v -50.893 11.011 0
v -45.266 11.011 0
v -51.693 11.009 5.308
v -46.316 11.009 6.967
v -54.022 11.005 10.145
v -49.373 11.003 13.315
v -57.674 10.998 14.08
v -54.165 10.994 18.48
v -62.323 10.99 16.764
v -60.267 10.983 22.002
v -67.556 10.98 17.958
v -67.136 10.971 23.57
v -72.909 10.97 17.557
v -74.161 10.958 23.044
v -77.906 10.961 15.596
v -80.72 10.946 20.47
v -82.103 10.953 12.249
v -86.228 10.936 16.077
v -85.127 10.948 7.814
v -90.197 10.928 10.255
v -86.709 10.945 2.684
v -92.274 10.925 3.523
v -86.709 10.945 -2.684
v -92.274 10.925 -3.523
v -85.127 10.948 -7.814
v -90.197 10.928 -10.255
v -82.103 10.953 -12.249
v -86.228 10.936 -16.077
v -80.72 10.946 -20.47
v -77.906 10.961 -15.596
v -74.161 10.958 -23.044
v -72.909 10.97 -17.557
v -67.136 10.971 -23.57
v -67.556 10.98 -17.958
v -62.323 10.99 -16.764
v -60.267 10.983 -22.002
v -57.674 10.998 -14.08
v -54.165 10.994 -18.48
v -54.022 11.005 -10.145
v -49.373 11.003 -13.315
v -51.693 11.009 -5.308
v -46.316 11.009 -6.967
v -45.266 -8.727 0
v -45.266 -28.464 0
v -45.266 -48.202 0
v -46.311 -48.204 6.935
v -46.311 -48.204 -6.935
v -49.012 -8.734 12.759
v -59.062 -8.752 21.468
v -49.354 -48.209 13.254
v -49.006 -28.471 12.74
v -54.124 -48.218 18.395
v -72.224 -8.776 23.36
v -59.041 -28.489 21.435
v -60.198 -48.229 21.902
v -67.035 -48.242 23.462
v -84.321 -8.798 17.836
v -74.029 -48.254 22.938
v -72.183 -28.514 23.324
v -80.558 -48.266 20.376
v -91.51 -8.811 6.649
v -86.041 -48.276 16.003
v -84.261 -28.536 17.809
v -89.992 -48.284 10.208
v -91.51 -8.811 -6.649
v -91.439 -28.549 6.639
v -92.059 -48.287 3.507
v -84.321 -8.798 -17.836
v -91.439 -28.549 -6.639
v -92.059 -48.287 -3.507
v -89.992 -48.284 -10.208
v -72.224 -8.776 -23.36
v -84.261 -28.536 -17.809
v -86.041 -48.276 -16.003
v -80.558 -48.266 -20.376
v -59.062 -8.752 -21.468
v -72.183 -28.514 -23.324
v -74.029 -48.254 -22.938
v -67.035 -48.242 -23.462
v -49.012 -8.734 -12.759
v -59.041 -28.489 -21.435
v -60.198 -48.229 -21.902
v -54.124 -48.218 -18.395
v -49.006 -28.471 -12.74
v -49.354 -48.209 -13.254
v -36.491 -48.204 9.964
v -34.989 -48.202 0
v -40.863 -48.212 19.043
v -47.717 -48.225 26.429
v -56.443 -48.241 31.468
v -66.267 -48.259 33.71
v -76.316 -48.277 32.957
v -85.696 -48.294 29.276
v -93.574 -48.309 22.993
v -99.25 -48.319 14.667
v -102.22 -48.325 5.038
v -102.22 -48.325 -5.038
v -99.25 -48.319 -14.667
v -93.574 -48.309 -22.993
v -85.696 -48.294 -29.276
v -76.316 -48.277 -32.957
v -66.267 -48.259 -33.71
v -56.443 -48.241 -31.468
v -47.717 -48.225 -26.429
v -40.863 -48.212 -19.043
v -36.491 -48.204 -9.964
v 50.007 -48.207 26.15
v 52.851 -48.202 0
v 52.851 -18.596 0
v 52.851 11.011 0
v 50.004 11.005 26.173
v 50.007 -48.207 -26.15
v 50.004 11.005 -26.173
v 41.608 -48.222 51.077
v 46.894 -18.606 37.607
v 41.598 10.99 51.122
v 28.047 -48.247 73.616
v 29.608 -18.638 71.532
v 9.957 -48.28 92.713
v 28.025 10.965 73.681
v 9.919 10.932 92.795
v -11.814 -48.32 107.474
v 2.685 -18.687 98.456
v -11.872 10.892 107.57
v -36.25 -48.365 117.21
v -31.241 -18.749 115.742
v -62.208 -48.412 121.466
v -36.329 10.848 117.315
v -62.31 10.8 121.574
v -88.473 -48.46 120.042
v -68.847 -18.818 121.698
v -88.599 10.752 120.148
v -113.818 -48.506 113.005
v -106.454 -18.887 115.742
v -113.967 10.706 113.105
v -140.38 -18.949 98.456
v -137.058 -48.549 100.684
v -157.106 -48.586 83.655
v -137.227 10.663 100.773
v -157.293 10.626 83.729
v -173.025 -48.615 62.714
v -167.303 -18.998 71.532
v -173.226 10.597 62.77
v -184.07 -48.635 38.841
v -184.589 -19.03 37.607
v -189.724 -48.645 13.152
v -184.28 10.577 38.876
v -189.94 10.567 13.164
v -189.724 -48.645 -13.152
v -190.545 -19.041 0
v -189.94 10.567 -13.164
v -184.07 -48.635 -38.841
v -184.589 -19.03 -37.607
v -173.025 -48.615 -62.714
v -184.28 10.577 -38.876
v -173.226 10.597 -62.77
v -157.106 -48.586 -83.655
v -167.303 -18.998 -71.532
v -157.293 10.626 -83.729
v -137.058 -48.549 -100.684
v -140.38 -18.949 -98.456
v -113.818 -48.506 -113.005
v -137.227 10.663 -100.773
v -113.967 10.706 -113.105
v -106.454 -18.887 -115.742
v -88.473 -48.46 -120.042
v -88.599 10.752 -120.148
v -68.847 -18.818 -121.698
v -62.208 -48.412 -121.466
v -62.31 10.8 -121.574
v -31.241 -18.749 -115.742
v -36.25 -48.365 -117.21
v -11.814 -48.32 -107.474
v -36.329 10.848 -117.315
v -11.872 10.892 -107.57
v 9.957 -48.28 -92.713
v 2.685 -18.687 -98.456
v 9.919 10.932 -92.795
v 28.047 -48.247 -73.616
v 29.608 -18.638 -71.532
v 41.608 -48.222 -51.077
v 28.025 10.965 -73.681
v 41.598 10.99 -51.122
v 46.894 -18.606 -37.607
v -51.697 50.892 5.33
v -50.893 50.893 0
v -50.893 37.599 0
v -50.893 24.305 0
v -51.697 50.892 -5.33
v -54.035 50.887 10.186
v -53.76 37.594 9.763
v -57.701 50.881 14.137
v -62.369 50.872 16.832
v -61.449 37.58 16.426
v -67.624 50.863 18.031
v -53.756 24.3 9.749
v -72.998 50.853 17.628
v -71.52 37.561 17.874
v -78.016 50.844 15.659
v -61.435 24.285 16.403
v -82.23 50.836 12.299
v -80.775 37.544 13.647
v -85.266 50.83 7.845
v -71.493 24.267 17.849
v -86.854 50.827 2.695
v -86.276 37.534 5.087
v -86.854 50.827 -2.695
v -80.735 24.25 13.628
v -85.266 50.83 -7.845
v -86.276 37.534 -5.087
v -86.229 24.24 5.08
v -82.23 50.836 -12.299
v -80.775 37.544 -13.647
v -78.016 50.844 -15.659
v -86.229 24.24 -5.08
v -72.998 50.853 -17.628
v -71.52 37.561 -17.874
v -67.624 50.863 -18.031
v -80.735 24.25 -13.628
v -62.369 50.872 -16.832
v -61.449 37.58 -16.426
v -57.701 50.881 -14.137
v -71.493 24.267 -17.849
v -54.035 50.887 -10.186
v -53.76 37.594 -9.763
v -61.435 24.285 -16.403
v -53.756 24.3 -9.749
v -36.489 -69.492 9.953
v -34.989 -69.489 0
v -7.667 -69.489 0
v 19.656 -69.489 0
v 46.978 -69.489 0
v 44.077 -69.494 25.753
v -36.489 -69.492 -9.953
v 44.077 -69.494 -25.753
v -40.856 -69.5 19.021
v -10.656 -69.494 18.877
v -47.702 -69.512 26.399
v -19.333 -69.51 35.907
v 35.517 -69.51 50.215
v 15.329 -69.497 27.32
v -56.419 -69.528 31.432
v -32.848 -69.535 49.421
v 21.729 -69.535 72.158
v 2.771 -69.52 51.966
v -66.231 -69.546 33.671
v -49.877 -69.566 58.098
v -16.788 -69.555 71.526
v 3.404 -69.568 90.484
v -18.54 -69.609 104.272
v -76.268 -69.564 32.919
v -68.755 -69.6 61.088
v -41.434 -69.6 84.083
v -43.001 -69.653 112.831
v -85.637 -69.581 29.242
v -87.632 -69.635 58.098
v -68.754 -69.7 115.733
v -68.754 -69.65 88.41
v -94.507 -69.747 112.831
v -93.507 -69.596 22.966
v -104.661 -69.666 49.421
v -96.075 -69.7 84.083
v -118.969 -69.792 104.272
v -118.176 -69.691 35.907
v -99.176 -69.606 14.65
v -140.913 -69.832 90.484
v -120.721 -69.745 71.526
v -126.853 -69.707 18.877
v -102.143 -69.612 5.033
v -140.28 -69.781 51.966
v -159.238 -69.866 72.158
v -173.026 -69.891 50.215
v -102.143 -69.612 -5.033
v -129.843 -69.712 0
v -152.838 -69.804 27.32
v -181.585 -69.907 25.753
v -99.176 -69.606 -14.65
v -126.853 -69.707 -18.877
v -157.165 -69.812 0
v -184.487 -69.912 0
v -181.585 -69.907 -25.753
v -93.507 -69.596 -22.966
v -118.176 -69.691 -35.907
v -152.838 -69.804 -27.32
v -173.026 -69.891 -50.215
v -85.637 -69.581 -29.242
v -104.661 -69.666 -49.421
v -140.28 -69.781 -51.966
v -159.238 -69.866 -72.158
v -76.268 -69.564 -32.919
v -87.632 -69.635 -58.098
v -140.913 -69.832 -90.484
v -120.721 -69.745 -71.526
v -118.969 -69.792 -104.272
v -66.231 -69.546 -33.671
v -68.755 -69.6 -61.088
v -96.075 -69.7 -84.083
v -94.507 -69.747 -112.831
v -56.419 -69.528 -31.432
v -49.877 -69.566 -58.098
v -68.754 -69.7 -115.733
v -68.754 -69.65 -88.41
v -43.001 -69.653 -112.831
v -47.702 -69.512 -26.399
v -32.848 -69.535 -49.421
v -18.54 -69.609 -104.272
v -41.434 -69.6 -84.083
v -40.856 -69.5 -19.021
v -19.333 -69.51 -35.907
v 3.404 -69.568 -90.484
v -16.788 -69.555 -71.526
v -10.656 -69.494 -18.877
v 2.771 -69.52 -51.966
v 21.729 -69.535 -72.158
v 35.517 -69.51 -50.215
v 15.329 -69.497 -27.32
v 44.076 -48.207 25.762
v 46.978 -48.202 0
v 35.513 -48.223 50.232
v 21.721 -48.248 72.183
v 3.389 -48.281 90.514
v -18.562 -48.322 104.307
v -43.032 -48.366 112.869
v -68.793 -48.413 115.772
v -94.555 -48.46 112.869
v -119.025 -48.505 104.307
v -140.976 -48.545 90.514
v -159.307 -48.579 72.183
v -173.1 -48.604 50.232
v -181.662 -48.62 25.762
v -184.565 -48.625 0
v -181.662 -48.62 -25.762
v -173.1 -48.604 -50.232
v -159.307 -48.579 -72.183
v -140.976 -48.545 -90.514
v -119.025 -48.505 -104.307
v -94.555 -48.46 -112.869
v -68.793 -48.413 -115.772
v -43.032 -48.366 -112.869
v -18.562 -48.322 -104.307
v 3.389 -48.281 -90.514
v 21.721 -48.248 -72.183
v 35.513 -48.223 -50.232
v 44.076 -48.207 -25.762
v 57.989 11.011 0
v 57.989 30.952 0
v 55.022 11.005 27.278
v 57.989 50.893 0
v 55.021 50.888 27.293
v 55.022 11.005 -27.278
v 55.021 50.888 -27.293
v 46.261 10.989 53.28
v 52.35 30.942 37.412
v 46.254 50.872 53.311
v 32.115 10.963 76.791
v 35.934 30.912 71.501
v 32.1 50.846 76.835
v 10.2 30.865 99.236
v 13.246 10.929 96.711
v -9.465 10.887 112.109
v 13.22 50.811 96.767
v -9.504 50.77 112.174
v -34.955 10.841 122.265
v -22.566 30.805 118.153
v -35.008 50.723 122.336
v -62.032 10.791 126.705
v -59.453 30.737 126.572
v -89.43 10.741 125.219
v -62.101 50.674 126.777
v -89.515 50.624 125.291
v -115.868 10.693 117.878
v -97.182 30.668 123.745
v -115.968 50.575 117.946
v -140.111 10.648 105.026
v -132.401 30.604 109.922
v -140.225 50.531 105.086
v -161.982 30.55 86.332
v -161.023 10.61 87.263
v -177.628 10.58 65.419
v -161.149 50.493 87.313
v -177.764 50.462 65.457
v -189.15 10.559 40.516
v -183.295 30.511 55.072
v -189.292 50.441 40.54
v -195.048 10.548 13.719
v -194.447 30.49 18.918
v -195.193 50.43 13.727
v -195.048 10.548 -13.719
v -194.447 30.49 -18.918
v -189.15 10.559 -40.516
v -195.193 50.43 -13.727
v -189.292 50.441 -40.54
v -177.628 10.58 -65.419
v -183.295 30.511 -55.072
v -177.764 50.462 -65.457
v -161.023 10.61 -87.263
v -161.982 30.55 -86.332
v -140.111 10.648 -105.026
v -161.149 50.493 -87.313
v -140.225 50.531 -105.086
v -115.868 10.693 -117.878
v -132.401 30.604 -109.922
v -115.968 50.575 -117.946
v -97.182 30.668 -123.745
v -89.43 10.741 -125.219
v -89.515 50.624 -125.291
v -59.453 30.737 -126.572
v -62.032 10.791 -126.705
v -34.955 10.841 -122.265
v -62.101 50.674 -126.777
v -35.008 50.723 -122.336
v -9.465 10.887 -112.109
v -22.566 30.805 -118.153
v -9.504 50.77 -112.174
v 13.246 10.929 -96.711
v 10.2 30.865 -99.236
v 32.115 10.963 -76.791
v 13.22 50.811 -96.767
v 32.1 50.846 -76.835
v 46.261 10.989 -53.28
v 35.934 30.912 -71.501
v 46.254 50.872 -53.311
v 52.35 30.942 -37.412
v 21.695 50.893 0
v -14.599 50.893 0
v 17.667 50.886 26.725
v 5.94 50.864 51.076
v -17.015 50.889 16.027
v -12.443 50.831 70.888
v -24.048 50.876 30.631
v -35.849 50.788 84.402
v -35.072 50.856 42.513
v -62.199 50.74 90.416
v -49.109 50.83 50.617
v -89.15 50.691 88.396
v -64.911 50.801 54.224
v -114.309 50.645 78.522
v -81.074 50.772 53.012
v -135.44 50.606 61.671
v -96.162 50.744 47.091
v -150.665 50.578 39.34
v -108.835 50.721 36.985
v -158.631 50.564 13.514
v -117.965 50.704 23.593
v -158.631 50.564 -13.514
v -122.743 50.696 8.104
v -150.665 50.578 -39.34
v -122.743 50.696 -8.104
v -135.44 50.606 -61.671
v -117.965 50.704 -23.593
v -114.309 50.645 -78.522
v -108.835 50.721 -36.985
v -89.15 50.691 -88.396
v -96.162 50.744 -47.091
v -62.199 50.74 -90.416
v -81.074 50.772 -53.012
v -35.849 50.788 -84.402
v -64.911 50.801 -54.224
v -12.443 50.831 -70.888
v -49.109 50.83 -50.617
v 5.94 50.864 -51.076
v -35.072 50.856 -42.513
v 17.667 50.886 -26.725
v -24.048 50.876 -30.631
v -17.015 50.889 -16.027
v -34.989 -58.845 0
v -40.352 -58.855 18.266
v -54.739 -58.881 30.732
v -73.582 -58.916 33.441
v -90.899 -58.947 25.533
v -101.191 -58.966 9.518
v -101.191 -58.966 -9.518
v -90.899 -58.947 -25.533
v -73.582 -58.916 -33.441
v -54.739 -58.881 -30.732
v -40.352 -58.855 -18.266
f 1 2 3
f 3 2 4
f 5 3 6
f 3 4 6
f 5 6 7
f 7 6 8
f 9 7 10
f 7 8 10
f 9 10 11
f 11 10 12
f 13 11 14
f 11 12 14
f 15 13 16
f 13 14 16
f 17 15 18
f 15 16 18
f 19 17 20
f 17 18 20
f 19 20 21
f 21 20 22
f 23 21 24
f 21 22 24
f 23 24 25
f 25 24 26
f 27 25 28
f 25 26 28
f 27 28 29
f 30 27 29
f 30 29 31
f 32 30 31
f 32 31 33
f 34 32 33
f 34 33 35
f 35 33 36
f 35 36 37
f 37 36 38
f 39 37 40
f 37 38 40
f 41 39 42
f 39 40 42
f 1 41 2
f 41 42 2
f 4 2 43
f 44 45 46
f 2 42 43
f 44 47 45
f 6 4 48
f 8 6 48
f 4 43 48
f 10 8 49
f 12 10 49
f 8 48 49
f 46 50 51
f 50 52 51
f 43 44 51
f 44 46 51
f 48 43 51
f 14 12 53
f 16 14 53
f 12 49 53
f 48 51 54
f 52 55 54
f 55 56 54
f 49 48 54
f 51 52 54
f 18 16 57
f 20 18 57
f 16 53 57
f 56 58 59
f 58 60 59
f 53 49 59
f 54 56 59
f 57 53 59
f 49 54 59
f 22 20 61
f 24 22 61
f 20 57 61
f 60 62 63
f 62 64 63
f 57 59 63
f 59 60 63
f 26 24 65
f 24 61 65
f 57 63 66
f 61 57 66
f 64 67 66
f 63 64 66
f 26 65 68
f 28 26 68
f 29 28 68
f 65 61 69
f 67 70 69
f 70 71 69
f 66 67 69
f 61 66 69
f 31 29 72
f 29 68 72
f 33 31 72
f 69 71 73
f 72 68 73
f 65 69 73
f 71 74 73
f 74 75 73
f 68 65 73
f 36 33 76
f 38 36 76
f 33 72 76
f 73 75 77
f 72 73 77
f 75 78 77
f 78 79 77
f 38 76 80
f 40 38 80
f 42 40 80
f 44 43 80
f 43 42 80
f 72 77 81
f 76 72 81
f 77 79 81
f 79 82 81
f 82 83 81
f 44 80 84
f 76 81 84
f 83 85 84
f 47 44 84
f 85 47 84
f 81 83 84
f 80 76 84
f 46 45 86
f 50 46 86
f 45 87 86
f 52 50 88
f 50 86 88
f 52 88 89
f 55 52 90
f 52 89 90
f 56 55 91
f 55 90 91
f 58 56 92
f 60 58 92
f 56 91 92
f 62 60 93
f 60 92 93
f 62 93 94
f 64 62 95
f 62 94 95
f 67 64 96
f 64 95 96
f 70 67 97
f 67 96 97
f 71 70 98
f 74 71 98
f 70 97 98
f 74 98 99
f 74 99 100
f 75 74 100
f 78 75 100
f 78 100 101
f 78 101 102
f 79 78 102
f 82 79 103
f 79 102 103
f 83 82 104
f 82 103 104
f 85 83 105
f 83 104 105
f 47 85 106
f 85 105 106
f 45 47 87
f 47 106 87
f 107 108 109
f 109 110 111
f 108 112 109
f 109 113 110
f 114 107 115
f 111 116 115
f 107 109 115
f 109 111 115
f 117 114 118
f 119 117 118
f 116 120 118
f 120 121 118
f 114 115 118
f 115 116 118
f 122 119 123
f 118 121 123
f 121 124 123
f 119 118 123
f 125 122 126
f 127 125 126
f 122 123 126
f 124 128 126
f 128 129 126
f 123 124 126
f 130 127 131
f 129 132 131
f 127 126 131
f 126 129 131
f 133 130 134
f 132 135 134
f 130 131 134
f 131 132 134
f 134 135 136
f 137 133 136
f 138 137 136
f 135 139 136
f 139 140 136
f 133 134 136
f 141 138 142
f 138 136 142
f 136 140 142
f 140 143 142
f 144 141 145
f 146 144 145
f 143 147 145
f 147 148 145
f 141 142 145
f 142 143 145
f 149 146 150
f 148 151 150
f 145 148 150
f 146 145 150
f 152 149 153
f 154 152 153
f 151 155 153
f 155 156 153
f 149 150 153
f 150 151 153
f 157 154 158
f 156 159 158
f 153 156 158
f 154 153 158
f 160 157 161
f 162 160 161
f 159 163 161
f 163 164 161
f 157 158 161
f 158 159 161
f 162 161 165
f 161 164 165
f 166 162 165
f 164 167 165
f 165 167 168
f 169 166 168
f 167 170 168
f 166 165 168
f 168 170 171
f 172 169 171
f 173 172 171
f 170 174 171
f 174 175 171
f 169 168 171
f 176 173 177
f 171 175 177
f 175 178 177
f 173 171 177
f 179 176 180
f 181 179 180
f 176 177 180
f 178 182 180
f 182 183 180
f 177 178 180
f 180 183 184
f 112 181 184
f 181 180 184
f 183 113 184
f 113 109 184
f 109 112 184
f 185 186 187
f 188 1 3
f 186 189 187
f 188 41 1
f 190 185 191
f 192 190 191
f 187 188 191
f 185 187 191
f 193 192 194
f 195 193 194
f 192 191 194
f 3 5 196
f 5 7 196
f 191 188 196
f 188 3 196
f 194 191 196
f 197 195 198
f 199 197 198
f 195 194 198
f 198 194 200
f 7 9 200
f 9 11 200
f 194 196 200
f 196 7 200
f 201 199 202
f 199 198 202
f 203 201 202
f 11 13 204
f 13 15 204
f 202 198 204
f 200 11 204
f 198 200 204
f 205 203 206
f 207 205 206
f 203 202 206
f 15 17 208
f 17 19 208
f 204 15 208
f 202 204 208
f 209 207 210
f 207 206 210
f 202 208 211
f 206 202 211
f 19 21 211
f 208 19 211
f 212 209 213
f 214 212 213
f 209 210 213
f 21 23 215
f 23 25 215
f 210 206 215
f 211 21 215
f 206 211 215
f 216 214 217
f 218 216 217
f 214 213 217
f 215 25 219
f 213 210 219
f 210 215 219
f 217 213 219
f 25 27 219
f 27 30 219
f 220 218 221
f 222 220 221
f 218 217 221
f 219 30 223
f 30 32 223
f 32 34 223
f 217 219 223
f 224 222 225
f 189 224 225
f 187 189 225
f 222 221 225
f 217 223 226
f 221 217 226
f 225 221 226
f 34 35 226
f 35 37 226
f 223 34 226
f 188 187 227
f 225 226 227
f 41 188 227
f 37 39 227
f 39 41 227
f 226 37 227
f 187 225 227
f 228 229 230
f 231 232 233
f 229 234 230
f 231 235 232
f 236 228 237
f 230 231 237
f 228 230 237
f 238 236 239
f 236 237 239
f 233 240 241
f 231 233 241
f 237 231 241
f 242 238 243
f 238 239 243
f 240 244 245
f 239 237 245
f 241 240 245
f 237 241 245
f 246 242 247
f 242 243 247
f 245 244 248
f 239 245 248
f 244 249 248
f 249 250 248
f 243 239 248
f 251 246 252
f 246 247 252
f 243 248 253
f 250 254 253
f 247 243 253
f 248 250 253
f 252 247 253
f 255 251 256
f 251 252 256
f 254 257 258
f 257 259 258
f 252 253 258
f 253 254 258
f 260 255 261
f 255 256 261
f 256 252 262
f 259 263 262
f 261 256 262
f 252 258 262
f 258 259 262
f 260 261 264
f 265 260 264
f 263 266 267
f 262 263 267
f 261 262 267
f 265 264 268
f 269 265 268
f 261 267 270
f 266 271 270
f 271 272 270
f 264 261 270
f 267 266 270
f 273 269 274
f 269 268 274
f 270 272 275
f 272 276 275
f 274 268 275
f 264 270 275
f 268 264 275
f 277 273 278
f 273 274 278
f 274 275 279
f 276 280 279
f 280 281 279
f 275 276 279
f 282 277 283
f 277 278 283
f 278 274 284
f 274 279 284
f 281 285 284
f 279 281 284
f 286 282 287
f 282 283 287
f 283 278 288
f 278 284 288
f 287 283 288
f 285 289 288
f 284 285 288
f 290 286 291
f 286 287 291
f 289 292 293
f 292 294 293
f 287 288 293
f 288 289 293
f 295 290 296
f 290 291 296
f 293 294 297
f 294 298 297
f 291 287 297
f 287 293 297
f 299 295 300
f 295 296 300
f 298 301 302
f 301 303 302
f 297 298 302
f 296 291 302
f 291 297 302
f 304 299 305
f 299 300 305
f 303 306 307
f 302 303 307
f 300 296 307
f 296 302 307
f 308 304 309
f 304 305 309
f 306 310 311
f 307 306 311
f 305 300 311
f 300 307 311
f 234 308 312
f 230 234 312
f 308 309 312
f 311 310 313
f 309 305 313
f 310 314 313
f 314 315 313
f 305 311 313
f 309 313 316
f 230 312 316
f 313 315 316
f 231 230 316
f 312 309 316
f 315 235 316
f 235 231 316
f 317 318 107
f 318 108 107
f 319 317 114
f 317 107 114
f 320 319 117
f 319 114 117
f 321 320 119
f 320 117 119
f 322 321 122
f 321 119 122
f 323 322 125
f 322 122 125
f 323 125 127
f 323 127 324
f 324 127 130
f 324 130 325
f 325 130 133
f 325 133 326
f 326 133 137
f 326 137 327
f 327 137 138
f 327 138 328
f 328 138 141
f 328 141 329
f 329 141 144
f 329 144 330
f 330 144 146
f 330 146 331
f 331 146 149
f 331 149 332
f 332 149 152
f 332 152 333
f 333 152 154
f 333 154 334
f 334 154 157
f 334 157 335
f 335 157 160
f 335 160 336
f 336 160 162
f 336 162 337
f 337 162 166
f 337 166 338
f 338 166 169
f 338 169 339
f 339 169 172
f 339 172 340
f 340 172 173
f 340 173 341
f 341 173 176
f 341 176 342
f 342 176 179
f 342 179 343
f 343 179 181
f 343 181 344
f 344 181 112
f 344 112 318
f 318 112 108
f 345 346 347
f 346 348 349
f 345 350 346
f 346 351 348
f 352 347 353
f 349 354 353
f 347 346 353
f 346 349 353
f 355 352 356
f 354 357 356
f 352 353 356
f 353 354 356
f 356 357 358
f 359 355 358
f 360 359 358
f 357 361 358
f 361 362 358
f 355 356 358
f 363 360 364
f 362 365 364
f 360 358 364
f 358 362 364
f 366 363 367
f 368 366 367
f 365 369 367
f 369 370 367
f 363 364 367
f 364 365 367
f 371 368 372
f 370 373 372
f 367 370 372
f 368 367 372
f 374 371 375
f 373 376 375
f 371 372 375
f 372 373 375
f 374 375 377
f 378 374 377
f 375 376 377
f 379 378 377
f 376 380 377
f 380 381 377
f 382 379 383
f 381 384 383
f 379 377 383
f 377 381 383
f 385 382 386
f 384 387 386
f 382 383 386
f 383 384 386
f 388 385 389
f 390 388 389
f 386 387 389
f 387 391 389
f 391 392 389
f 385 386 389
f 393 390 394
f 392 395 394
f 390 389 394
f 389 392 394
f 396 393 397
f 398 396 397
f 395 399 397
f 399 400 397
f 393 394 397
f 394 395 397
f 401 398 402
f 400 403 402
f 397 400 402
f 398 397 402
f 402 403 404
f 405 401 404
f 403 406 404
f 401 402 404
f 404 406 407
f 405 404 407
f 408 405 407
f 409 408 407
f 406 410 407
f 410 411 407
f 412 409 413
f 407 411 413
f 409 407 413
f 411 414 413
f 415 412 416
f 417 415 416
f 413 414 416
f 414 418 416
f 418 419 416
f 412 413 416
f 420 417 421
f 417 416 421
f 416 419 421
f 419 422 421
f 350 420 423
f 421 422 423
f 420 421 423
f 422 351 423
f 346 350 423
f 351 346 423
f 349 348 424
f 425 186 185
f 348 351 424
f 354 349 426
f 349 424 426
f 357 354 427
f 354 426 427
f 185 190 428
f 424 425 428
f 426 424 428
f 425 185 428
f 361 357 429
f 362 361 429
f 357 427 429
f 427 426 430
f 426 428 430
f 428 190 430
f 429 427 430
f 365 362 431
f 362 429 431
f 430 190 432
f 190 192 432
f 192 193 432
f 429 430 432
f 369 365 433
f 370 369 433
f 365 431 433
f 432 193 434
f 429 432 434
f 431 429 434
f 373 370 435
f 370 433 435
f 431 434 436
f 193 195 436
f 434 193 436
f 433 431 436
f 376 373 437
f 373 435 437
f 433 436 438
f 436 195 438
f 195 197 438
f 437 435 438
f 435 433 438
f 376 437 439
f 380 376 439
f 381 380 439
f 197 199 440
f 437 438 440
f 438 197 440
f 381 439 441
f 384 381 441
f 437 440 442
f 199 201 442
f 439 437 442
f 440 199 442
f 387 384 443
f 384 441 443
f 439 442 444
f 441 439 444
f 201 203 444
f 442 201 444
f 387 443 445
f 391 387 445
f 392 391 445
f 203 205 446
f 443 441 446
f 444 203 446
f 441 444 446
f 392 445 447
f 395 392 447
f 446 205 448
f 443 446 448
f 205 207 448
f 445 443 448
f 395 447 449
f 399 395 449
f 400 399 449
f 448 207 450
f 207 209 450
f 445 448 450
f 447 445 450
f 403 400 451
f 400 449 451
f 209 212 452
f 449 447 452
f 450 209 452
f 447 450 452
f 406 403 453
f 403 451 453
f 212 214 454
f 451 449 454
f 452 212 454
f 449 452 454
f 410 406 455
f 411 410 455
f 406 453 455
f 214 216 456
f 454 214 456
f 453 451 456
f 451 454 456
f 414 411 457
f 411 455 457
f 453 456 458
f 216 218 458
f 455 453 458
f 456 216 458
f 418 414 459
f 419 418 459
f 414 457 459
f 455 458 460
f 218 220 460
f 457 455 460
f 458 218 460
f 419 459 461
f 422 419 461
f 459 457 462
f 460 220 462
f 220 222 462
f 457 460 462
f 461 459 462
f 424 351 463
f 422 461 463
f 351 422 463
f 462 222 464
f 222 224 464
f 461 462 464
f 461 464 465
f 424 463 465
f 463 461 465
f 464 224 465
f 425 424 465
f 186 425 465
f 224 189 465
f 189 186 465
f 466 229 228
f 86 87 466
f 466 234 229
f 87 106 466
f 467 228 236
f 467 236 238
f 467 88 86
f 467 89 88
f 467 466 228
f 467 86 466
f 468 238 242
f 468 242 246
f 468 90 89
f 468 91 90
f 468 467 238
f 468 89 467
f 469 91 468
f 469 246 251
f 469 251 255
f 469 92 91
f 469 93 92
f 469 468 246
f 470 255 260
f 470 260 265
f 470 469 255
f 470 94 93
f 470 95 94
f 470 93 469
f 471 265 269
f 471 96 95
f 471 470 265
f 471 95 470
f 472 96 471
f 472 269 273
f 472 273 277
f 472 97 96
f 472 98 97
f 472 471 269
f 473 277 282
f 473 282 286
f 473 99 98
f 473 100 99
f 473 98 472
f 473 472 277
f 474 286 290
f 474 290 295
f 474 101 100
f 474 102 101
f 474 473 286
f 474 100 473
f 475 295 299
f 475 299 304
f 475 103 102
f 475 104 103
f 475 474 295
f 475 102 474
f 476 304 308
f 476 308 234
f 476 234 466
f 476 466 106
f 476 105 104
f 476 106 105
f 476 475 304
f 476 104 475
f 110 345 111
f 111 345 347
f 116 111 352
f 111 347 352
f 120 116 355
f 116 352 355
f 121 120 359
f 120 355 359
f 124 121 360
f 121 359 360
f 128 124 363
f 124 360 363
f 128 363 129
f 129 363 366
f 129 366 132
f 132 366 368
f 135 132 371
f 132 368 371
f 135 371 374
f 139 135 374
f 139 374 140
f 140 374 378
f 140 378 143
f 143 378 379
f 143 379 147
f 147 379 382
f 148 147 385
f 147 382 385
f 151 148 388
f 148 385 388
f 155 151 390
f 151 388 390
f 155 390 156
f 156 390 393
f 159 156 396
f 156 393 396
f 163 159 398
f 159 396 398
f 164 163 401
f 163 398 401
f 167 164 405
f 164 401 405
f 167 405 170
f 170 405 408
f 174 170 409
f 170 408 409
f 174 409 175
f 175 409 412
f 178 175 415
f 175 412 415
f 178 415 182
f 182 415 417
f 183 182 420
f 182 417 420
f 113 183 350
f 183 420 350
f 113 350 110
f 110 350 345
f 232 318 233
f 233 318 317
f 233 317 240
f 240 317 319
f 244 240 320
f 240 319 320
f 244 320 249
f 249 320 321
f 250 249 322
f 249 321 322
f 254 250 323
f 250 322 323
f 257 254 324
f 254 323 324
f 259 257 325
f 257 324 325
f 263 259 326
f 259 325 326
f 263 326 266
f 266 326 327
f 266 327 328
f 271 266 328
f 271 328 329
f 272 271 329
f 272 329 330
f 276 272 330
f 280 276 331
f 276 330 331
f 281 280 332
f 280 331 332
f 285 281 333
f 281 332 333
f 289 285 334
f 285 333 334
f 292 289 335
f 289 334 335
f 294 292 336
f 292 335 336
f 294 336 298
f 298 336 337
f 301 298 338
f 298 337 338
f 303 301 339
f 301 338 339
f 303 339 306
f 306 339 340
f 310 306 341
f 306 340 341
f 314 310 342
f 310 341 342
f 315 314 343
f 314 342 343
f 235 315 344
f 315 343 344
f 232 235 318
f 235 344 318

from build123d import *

# Parameters (mm, degrees)
F0_W = 81.9674320519
F0_H = 21.2870649993


with BuildPart() as f1:
    # F0 (on Top) → F1 (revolve)
    with BuildSketch(Plane.XY):
        Polygon((52.8506450355, 11.0105508938), (-45.26559636, 11.0105508938), (-45.26559636, -48.2017435133), (-34.9890813231, -48.2017435133), (46.9783507288, -48.2017435133), (52.8506450355, -48.2017435133), align=None)
        with Locations((5.9946347028, -58.845276013)):
            Rectangle(F0_W, F0_H)
        Polygon((57.9889006913, 50.8932135999), (-50.8932098746, 50.8932135999), (-50.8932098746, 11.0105508938), (-45.26559636, 11.0105508938), (52.8506450355, 11.0105508938), (57.9889006913, 11.0105508938), align=None)
    revolve(axis=Axis((-68.8771121204, -2.5691278279, 0), (0.0018281924, -0.9999983289, 0)))


solid = f1.part
